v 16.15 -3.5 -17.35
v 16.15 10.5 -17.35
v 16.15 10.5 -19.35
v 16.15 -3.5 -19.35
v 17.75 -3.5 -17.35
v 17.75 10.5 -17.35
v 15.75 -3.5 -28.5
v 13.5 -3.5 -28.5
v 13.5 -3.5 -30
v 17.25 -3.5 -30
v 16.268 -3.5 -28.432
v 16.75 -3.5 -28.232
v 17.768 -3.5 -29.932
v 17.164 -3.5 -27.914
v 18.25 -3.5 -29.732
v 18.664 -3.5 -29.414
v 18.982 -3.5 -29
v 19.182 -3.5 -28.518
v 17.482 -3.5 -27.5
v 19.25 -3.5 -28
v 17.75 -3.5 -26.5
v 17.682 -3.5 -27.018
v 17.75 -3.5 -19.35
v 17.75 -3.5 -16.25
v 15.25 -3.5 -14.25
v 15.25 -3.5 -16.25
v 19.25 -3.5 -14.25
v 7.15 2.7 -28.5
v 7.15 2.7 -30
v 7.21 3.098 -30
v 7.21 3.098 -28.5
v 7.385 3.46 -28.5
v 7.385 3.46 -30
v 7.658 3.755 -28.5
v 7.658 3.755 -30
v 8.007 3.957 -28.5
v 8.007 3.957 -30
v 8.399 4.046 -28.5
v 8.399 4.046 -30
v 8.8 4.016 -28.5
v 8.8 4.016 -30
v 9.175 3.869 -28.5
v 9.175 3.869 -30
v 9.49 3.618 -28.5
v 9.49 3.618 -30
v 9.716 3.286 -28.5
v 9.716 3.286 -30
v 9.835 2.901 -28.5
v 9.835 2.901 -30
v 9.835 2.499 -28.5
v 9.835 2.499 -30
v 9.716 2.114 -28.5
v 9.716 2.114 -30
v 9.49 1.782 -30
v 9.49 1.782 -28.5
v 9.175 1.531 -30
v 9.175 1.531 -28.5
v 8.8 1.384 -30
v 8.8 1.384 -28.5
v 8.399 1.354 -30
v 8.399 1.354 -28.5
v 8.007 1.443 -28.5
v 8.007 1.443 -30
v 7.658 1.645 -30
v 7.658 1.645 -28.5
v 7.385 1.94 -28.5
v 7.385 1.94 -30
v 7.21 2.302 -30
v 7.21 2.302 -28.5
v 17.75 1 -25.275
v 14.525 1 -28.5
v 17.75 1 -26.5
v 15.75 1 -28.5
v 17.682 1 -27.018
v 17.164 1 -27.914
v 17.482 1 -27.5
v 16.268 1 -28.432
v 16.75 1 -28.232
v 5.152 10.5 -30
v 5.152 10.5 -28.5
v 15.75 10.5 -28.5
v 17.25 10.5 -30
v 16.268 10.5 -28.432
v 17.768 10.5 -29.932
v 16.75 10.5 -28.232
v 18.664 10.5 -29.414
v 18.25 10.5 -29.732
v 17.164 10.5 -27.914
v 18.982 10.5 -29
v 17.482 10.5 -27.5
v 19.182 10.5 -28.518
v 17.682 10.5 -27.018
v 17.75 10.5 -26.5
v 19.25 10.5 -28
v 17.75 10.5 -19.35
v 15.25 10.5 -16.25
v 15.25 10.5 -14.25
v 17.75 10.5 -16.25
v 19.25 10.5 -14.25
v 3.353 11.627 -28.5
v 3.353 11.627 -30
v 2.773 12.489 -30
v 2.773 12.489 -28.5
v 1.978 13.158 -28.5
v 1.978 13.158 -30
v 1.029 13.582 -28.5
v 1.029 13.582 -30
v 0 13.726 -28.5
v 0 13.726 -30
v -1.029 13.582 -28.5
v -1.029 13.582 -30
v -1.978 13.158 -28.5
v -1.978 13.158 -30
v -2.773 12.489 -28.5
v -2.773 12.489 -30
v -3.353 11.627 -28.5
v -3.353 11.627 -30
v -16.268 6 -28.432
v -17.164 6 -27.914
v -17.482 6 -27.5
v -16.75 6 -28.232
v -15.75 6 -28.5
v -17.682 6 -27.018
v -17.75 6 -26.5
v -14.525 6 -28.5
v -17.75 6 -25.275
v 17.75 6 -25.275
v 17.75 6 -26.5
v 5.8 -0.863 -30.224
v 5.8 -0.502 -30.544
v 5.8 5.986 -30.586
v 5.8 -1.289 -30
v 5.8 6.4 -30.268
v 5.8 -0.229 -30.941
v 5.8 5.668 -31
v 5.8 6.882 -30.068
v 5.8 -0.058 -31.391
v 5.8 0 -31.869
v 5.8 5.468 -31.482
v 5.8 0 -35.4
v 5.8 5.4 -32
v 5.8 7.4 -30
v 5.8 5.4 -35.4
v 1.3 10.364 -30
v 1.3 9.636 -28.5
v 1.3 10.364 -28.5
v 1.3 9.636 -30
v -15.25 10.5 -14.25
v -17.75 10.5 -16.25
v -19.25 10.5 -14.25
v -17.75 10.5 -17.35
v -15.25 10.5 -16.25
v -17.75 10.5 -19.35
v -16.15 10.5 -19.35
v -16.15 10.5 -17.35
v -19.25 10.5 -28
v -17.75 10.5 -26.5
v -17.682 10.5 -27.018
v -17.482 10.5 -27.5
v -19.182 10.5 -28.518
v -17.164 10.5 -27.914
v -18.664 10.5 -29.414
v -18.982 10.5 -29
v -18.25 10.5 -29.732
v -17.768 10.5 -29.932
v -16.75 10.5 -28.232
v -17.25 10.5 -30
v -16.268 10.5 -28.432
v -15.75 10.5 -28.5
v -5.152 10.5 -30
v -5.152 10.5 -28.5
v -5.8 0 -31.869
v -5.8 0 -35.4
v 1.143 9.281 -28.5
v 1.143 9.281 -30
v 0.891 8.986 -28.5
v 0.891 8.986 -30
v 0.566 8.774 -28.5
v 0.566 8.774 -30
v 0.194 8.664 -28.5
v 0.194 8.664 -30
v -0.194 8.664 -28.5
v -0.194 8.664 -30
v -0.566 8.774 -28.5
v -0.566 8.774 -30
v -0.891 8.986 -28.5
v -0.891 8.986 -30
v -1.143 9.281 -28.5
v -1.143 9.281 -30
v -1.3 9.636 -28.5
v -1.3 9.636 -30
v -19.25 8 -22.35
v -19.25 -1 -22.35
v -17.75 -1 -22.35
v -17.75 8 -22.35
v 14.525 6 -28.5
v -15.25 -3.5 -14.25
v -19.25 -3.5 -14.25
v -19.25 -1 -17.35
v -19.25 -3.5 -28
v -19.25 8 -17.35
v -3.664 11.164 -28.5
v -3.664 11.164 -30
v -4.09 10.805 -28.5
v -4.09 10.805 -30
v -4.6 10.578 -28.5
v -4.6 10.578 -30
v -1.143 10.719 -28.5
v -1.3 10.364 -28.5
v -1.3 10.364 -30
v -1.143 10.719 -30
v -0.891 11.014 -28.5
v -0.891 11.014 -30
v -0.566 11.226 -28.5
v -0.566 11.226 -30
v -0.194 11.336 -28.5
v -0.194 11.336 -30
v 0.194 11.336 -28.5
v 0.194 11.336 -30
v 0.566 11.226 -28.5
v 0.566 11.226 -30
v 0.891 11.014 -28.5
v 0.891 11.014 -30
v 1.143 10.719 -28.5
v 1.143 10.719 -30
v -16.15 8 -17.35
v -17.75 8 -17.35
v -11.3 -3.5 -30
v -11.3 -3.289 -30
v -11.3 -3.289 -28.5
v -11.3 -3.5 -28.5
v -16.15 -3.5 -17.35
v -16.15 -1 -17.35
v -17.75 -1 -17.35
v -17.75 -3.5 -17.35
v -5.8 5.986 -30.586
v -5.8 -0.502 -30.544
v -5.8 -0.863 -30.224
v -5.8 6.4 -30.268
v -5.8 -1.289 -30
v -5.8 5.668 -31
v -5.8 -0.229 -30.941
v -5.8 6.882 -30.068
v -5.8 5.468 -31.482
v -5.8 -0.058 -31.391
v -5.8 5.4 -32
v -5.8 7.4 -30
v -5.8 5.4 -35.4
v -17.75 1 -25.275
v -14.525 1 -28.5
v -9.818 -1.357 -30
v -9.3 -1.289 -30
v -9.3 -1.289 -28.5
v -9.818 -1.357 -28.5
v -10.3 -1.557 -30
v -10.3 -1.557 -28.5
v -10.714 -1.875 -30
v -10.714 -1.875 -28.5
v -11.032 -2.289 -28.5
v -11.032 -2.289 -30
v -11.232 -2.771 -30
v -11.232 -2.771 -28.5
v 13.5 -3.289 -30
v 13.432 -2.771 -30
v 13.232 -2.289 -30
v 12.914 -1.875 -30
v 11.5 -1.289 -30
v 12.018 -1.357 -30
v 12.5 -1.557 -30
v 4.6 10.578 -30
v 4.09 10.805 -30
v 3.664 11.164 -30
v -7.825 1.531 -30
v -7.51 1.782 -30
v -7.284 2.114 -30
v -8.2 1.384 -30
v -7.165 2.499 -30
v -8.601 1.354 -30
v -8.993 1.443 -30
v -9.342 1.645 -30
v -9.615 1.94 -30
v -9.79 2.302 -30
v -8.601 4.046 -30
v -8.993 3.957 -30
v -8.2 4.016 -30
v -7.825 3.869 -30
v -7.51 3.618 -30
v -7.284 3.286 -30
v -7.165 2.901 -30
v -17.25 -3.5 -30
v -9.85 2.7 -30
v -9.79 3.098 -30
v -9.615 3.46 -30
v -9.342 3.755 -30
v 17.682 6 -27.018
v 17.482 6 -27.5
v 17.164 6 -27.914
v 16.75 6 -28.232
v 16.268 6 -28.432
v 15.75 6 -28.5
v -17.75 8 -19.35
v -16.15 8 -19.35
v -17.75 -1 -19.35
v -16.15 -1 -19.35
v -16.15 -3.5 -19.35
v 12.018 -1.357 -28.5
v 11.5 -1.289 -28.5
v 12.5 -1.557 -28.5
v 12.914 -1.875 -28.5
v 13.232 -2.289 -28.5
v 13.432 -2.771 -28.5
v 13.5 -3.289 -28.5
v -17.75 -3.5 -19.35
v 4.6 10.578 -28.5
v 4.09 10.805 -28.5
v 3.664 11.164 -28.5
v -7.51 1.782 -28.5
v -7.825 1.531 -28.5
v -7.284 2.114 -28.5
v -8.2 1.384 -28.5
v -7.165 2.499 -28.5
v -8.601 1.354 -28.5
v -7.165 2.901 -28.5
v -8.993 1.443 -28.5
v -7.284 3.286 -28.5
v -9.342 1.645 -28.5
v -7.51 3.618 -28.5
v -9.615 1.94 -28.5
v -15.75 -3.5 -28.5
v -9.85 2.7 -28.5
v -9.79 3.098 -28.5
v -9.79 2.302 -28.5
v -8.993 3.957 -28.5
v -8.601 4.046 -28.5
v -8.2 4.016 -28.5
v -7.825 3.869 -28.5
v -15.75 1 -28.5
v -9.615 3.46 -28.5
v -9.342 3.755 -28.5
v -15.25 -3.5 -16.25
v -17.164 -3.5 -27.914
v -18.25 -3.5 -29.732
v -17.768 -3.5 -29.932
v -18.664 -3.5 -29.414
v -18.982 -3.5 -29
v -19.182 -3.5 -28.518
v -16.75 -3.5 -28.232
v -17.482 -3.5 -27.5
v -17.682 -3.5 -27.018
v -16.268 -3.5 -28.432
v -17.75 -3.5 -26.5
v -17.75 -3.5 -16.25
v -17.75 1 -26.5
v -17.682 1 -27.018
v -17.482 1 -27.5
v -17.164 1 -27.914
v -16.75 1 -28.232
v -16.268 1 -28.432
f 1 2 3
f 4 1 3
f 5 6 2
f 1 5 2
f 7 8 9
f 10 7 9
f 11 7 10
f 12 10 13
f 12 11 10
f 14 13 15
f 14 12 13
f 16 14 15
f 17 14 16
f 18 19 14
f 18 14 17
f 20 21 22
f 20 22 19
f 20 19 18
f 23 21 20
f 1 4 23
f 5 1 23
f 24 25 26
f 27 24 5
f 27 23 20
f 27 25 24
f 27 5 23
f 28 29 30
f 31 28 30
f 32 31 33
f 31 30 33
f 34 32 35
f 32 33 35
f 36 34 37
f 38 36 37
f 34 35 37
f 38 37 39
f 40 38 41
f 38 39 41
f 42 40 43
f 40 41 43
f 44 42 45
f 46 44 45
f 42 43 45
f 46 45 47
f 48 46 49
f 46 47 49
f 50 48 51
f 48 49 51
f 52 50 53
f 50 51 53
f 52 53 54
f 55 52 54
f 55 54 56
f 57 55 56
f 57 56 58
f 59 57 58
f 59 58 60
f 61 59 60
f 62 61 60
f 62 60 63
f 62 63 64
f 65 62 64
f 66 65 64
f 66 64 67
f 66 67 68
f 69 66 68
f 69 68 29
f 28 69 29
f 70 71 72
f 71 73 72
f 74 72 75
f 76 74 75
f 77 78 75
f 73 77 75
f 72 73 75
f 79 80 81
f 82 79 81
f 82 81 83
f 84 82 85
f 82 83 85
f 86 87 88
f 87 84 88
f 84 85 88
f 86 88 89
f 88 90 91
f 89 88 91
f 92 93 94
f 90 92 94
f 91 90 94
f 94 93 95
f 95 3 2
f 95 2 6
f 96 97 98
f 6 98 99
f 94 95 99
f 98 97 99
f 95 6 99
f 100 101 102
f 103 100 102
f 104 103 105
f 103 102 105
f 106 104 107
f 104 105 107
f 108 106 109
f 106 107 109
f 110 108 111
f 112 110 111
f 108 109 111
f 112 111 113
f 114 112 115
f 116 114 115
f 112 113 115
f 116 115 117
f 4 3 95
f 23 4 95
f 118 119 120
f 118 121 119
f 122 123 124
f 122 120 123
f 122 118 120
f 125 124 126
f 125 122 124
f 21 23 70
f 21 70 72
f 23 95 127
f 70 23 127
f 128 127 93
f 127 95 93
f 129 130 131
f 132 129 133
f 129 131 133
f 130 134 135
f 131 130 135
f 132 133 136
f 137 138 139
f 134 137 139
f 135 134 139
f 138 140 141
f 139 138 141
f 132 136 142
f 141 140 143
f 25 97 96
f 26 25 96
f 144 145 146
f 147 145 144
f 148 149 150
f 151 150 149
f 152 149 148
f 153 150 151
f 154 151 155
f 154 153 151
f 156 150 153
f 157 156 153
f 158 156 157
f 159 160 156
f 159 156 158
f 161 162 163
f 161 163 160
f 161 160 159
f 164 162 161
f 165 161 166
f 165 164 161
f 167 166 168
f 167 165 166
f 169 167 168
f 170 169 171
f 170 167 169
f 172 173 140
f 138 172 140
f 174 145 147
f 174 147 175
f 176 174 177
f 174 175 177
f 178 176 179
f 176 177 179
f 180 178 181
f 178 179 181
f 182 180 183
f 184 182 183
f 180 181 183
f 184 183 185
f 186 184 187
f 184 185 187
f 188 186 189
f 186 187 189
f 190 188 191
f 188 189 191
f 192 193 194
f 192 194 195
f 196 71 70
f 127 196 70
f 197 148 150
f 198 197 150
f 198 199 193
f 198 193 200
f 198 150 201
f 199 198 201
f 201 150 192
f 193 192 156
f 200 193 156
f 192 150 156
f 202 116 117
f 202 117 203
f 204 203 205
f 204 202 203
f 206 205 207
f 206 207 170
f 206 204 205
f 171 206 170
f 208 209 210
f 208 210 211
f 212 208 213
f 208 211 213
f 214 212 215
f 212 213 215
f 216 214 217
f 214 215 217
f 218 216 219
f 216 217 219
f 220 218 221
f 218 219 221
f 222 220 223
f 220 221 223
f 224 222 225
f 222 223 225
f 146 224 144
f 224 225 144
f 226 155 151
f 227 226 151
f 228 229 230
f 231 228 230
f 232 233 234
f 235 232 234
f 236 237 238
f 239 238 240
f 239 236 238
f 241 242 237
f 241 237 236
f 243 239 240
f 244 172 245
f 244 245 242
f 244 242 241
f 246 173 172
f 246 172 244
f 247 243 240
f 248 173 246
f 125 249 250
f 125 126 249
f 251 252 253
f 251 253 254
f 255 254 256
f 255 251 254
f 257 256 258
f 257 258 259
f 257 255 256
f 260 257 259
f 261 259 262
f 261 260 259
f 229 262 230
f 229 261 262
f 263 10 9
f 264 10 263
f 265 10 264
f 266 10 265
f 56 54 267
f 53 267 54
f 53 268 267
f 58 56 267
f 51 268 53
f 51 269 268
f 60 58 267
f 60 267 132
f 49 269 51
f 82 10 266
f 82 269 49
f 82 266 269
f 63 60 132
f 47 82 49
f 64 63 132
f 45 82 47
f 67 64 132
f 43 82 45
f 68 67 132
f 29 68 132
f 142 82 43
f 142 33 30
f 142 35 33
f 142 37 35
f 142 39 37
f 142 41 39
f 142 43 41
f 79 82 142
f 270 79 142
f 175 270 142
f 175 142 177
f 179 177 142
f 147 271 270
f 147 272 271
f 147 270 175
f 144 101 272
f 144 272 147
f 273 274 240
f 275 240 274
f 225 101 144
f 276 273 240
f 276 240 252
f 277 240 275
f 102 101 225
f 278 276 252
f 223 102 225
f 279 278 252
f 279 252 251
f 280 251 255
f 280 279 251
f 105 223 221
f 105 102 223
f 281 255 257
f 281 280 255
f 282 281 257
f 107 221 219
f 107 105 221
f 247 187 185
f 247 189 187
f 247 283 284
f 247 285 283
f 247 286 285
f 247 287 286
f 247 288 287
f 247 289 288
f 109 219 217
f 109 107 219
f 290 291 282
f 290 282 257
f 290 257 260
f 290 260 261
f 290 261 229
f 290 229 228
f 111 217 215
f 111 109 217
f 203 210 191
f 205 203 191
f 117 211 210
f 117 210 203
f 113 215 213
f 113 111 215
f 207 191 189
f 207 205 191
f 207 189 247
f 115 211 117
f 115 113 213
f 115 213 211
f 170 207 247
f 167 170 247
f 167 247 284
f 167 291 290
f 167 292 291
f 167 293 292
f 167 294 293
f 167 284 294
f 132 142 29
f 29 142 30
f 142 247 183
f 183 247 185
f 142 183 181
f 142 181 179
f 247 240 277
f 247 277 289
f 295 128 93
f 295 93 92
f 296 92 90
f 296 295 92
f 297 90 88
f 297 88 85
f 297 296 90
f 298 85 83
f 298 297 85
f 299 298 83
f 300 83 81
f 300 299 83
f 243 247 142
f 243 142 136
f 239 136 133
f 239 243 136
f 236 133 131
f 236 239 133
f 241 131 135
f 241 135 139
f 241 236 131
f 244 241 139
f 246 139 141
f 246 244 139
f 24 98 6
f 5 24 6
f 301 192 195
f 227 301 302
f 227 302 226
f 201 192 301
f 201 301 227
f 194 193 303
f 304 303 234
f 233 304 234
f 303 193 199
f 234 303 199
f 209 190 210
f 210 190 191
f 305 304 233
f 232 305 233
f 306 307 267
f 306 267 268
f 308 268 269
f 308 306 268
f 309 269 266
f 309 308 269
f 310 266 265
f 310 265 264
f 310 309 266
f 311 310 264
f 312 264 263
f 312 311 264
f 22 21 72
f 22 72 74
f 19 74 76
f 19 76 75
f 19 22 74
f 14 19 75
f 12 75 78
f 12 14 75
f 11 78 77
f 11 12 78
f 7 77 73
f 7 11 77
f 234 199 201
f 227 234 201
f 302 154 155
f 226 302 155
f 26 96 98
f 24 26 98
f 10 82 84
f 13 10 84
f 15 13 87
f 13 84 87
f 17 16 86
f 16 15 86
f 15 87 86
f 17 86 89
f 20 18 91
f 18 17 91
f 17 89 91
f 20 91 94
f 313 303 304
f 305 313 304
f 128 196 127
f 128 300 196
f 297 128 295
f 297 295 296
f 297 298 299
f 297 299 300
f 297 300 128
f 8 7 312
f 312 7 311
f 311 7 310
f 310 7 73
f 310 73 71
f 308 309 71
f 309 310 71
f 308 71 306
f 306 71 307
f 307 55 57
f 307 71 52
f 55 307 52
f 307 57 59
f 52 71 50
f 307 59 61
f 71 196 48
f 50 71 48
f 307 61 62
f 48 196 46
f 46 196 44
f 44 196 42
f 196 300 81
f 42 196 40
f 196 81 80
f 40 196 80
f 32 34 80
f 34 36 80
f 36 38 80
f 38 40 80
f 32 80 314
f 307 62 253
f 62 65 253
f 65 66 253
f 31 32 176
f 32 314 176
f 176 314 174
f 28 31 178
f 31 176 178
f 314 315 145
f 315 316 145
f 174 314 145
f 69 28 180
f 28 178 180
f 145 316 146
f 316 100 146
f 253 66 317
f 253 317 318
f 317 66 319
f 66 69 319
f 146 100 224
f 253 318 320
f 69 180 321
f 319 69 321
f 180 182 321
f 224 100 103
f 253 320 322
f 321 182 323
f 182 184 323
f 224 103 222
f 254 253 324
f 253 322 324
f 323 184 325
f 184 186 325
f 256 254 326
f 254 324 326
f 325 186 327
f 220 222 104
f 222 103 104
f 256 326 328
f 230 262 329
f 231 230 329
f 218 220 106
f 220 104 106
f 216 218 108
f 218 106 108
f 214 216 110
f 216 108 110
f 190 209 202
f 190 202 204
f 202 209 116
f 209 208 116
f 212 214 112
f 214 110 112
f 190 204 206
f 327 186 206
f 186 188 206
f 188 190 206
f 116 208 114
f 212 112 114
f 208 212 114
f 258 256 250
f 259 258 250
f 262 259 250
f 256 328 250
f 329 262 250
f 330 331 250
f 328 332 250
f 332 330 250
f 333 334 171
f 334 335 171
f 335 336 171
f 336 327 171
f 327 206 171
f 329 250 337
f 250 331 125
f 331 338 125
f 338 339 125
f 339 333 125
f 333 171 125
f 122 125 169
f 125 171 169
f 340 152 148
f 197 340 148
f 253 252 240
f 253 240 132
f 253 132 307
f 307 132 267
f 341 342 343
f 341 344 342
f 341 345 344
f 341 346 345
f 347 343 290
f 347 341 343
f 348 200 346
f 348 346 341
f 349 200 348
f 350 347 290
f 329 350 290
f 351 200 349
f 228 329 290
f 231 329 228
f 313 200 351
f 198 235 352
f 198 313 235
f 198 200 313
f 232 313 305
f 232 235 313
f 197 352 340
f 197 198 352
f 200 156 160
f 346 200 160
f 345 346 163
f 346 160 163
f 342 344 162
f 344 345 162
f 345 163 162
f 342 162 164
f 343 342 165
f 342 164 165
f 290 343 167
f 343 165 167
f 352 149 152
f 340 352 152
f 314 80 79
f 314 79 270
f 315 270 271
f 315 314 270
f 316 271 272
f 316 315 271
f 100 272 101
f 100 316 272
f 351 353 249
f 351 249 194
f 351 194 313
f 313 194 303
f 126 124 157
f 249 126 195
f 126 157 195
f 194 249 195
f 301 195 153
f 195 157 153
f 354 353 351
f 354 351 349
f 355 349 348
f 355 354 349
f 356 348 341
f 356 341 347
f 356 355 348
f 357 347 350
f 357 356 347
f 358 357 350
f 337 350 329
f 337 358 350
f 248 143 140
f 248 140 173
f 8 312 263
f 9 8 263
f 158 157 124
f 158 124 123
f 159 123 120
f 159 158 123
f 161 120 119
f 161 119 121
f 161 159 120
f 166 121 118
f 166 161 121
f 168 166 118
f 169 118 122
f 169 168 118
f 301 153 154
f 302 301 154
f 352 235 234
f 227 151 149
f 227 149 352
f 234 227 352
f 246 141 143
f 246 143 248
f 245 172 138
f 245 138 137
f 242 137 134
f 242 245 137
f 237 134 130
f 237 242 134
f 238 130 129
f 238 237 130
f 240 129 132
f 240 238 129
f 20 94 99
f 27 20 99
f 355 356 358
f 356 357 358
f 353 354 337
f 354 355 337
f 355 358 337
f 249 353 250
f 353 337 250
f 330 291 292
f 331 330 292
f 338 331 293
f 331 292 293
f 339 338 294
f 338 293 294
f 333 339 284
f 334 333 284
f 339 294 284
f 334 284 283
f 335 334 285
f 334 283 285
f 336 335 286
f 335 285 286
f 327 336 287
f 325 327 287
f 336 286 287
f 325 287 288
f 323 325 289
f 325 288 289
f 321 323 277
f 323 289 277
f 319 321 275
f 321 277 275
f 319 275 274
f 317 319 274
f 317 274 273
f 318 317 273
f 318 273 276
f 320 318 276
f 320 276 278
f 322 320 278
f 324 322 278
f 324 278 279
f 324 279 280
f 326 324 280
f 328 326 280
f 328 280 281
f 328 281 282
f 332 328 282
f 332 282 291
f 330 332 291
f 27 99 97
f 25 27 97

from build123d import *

# Parameters (mm, degrees)
SKETCH_1_W               = 27
SKETCH_1_H               = 17
EXTRUDE_1_DEPTH          = 1
SKETCH_2_R               = 2.55
CUT_EXTRUDE_1_DEPTH      = 16.984367363
EXTRUDE_2_DEPTH          = 17
SKETCH_6_W               = 1.5
SKETCH_6_H               = 2
EXTRUDE_3_DEPTH          = 2
CHAMFER_1_SIZE           = 1
CUT_EXTRUDE_4_REACH      = 39.316
SKETCH_8_R               = 2
FILLET_1_R               = 3
SKETCH_9_W               = 7
SKETCH_9_H               = 13
EXTRUDE_4_DEPTH          = 1.5
SKETCH_7_R               = 1.35
CUT_EXTRUDE_5_DEPTH      = 10
CUT_EXTRUDE_6_REACH      = 41.373
FILLET_2_R               = 2.2
SKETCH_13_W              = 11.6
SKETCH_13_H              = 5.4
EXTRUDE_6_DEPTH          = 5.4
CUT_EXTRUDE_7_DEPTH      = 45.299097095
CUT_EXTRUDE_7_DEPTH_BACK = 45.299097095
SKETCH_14_OUTSIDE_W      = 46.85
SKETCH_14_OUTSIDE_H      = 49.25
SKETCH_14_OUTSIDE_W_2    = 27
SKETCH_14_OUTSIDE_H_2    = 6.9
EXTRUDE_7_DEPTH          = 3.5
EXTRUDE_7_DEPTH_BACK     = 10.5
SKETCH_16_W              = 5.6
SKETCH_16_H              = 1.5
SKETCH_16_W_2            = 4.4
SKETCH_16_W_3            = 12.2
EXTRUDE_8_DEPTH          = 2
EXTRUDE_9_DEPTH          = 2.5
CUT_EXTRUDE_8_REACH      = 55.893
SKETCH_18_W              = 5
SKETCH_18_H              = 9
EXTRUDE_START            = -1.5
SKETCH_19_R              = 3.726433752
SKETCH_19_R_2            = 1.35
SKETCH_19_W              = 24.8
SKETCH_19_H              = 1.288897449
EXTRUDE_10_DEPTH         = 1.5
FILLET_4_R               = 2


# Some blends are built 0.0001 mm under size
with BuildPart() as part:
    # 草图1 → 凸台-拉伸1 (new body)
    with BuildSketch(Plane.XY):
        Rectangle(SKETCH_1_W, SKETCH_1_H)
    extrude(amount=EXTRUDE_1_DEPTH)

    # 草图2 → 切除-拉伸1 (cut, through all)
    with BuildSketch(Plane.XY.offset(1)):
        with Locations((0, 4.125)):
            Circle(SKETCH_2_R)
        with Locations((0, -4.125)):
            Circle(SKETCH_2_R)
        with Locations((8.27, 4.125)):
            Circle(SKETCH_2_R)
        with Locations((8.27, -4.125)):
            Circle(SKETCH_2_R)
        with Locations((-8.27, 4.125)):
            Circle(SKETCH_2_R)
        with Locations((-8.27, -4.125)):
            Circle(SKETCH_2_R)
    extrude(amount=-CUT_EXTRUDE_1_DEPTH, mode=Mode.SUBTRACT)

    # 草图3 → 凸台-拉伸2 (add)
    with BuildSketch(Plane.XZ.offset(8.5)):
        Polygon((13.5, 0), (19, 0), (19, -28.5), (-13.5, -28.5), (-13.5, -30), (20.5, -30), (20.5, 1), (13.5, 1), align=None)
    extrude(amount=-EXTRUDE_2_DEPTH)

    # 草图6 → 凸台-拉伸3 (add, symmetric)
    with BuildSketch(Plane(origin=(0, 0, 0), x_dir=(1, 0, 0), z_dir=(0, 1, 0))):
        Polygon((19, 0), (19, 5), (14, 0), align=None)
        Polygon((19, 28.5), (14, 28.5), (19, 23.5), align=None)
        with Locations((18.25, 20)):
            Rectangle(SKETCH_6_W, SKETCH_6_H)
    extrude(amount=EXTRUDE_3_DEPTH, both=True)

    # 倒角1
    chamfer_1_edges = [part.edges().sort_by_distance(p)[0] for p in [
        (-13.5, 0, 0),
    ]]
    chamfer(chamfer_1_edges, length=CHAMFER_1_SIZE - 0.0001)  # a hair under: the kernel refuses the full size

    # 草图8 → 切除-拉伸4 (cut, up to next)
    with BuildSketch(Plane(origin=(0, 0, 0), x_dir=(-1, 0, 0), z_dir=(0, 0, -1)), mode=Mode.PRIVATE) as cut_extrude_4_sk1:
        Circle(SKETCH_8_R)
    cut_extrude_4_tool1 = extrude(cut_extrude_4_sk1.sketch, amount=-CUT_EXTRUDE_4_REACH, mode=Mode.PRIVATE) & part.part
    add(cut_extrude_4_tool1.solids().sort_by_distance((0, 0, 0))[0], mode=Mode.SUBTRACT)

    # 圆角1
    fillet_1_edges = [part.edges().sort_by_distance(p)[0] for p in [
        (20.5, 0, 1),
        (20.5, 0, -30),
        (19, 5.25, -28.5),
        (19, 5.25, 0),
        (19, -5.25, 0),
        (19, -5.25, -28.5),
    ]]
    fillet(fillet_1_edges, radius=FILLET_1_R)

    # 草图9 → 凸台-拉伸4 (add)
    with BuildSketch(Plane(origin=(0, 0, -30), x_dir=(-1, 0, 0), z_dir=(0, 0, -1))):
        with Locations((0, 6.5)):
            Rectangle(SKETCH_9_W, SKETCH_9_H)
    extrude(amount=-EXTRUDE_4_DEPTH)

    # 草图7 → 切除-拉伸5 (cut)
    with BuildSketch(Plane(origin=(0, 0, -30), x_dir=(-1, 0, 0), z_dir=(0, 0, -1))):
        with Locations((0, 10)):
            Circle(SKETCH_7_R)
        with Locations((-8.5, 2.7)):
            Circle(SKETCH_7_R)
        with Locations((8.5, 2.7)):
            Circle(SKETCH_7_R)
    extrude(amount=-CUT_EXTRUDE_5_DEPTH, mode=Mode.SUBTRACT)

    # 草图11 → 切除-拉伸6 (cut, up to next)
    with BuildSketch(Plane(origin=(0, 0, -30), x_dir=(-1, 0, 0), z_dir=(0, 0, -1)), mode=Mode.PRIVATE) as cut_extrude_6_sk1:
        with BuildLine():
            Line((13.5, -8.5), (13.5, 0))
            Line((13.5, 0), (-9, 0))
            ThreePointArc((-9, 0), (-15.01040764, -2.48959236), (-17.5, -8.5))
            Line((-17.5, -8.5), (13.5, -8.5))
        make_face()
    cut_extrude_6_tool1 = extrude(cut_extrude_6_sk1.sketch, amount=-CUT_EXTRUDE_6_REACH, mode=Mode.PRIVATE) & part.part
    add(cut_extrude_6_tool1.solids().sort_by_distance((1.149624, -4.397011, -30))[0], mode=Mode.SUBTRACT)

    # 圆角2
    fillet_2_edges = [part.edges().sort_by_distance(p)[0] for p in [
        (-3.5, 13, -29.25),
        (-3.5, 8.5, -29.25),
        (3.5, 13, -29.25),
        (3.5, 8.5, -29.25),
        (-13.5, 0, -29.25),
        (-13.5, 8.5, -29.25),
    ]]
    fillet(fillet_2_edges, radius=FILLET_2_R)

    # 草图13 → 凸台-拉伸6 (add)
    with BuildSketch(Plane(origin=(0, 0, -30), x_dir=(-1, 0, 0), z_dir=(0, 0, -1))):
        with Locations((0, 2.7)):
            Rectangle(SKETCH_13_W, SKETCH_13_H)
    extrude(amount=EXTRUDE_6_DEPTH)

    # 草图14 outside → 切除-拉伸7 (cut, two sides: drawn at the far end of the back side and taken through both)
    with BuildSketch(Plane(origin=(0, 8.5, 0), x_dir=(1, 0, 0), z_dir=(0, 1, 0)).offset(-CUT_EXTRUDE_7_DEPTH_BACK)):
        with Locations((3.5, 17.2)):
            Rectangle(SKETCH_14_OUTSIDE_W, SKETCH_14_OUTSIDE_H)
        with Locations((0, 31.95)):
            Rectangle(SKETCH_14_OUTSIDE_W_2, SKETCH_14_OUTSIDE_H_2, mode=Mode.SUBTRACT)
    extrude(amount=CUT_EXTRUDE_7_DEPTH + CUT_EXTRUDE_7_DEPTH_BACK, mode=Mode.SUBTRACT)

    # 草图15 → 凸台-拉伸7 (add, two sides: drawn at the far end of the back side and taken through both)
    with BuildSketch(Plane.XZ.offset(-EXTRUDE_7_DEPTH_BACK)):
        Polygon((-19.25, -14.25), (-19.25, -30), (-11.3, -30), (-11.3, -28.5), (-17.75, -28.5), (-17.75, -19.35), (-16.15, -19.35), (-16.15, -17.35), (-17.75, -17.35), (-17.75, -16.25), (-15.25, -16.25), (-15.25, -14.25), align=None)
        Polygon((17.75, -28.5), (13.5, -28.5), (13.5, -30), (19.25, -30), (19.25, -14.25), (15.25, -14.25), (15.25, -16.25), (17.75, -16.25), (17.75, -17.35), (16.15, -17.35), (16.15, -19.35), (17.75, -19.35), align=None)
    extrude(amount=EXTRUDE_7_DEPTH + EXTRUDE_7_DEPTH_BACK)

    # 草图16 → 凸台-拉伸8 (add)
    with BuildSketch(Plane(origin=(0, 8.5, 0), x_dir=(1, 0, 0), z_dir=(0, 1, 0))):
        with Locations((-8.5, 29.25)):
            Rectangle(SKETCH_16_W, SKETCH_16_H)
        with Locations((-3.5, 29.25)):
            Rectangle(SKETCH_16_W_2, SKETCH_16_H)
        with Locations((7.4, 29.25)):
            Rectangle(SKETCH_16_W_3, SKETCH_16_H)
    extrude(amount=EXTRUDE_8_DEPTH)

    # 草图17 → 凸台-拉伸9 (add, symmetric)
    with BuildSketch(Plane(origin=(0, 3.5, 0), x_dir=(-1, 0, 0), z_dir=(0, -1, 0))):
        Polygon((17.75, 25.275), (14.525, 28.5), (17.75, 28.5), align=None)
        Polygon((-17.75, 25.275), (-17.75, 28.5), (-14.525, 28.5), align=None)
    extrude(amount=EXTRUDE_9_DEPTH, both=True)

    # 草图18 → 切除-拉伸8 (cut, up to next)
    with BuildSketch(Plane.ZY.offset(19.25), mode=Mode.PRIVATE) as cut_extrude_8_sk1:
        with Locations((-19.85, 3.5)):
            Rectangle(SKETCH_18_W, SKETCH_18_H)
    cut_extrude_8_tool1 = extrude(cut_extrude_8_sk1.sketch, amount=-CUT_EXTRUDE_8_REACH, mode=Mode.PRIVATE) & part.part
    add(cut_extrude_8_tool1.solids().sort_by_distance((-19.25, 3.5, -19.85))[0], mode=Mode.SUBTRACT)

    # 草图19 → 凸台-拉伸10 (add)
    # profile 1 of 2: a face of its own
    with BuildSketch(Plane.XY.offset(-28.5).offset(EXTRUDE_START)):
        with Locations((0, 10)):
            Circle(SKETCH_19_R)
        with Locations((0, 10)):
            Circle(SKETCH_19_R_2, mode=Mode.SUBTRACT)
    # profile 2 of 2: a face of its own
    with BuildSketch(Plane.XY.offset(-28.5).offset(EXTRUDE_START)):
        with Locations((1.1, -0.644448725)):
            Rectangle(SKETCH_19_W, SKETCH_19_H)
    extrude(amount=EXTRUDE_10_DEPTH)

    # 圆角4
    # the kernel refuses this fillet: 2 mm, written as the material it adds along each edge
    with BuildSketch(Plane(origin=(-5.8, 5.4, -30), x_dir=(0, 1, 0), z_dir=(1, 0, 0))) as fillet_4_piece_1:
        with BuildLine():
            CenterArc((FILLET_4_R, -FILLET_4_R), FILLET_4_R, 90, 90)
            Line((0, -FILLET_4_R), (0, 0))
            Line((0, 0), (FILLET_4_R, 0))
        make_face()
    extrude(amount=11.6)
    with BuildSketch(Plane(origin=(13.5, -1.288897449, -28.5), x_dir=(0, -1, 0), z_dir=(0, 0, -1))) as fillet_4_piece_2:
        with BuildLine():
            CenterArc((FILLET_4_R, FILLET_4_R), FILLET_4_R, 180, 90)
            Line((0, FILLET_4_R), (0, 0))
            Line((0, 0), (FILLET_4_R, 0))
        make_face()
    extrude(amount=1.5)
    with BuildSketch(Plane(origin=(17.75, 1, -28.5), x_dir=(-1, 0, 0), z_dir=(0, 1, 0)), Plane(origin=(-17.75, 6, -28.5), x_dir=(1, 0, 0), z_dir=(0, -1, 0)), Plane(origin=(-17.75, 10.5, -28.5), x_dir=(1, 0, 0), z_dir=(0, -1, 0)), Plane(origin=(17.75, -3.5, -28.5), x_dir=(-1, 0, 0), z_dir=(0, 1, 0))) as fillet_4_piece_3:
        with BuildLine():
            CenterArc((FILLET_4_R, FILLET_4_R), FILLET_4_R, 180, 90)
            Line((0, FILLET_4_R), (0, 0))
            Line((0, 0), (FILLET_4_R, 0))
        make_face()
    extrude(amount=9.5)
    with BuildSketch(Plane(origin=(-3.692737265, 10.5, -28.5), x_dir=(-1, 0, 0), z_dir=(0, 0, -1))) as fillet_4_piece_4:
        with BuildLine():
            CenterArc((1.459159814, 2), FILLET_4_R, 205.88535786, 64.11464214)
            ThreePointArc((-0.340178937, 1.126856222), (-0.125315404, 0.576944648), (0, 0))
            Line((0, 0), (1.459159814, 0))
        make_face()
    extrude(amount=1.5)
    with BuildSketch(Plane(origin=(3.692737265, 10.5, -28.5), x_dir=(-0.28900142054358374, 0.9573286681823493, 0), z_dir=(0, 0, -1))) as fillet_4_piece_5:
        with BuildLine():
            CenterArc((1.492958077, 1.974898363), FILLET_4_R, 196.798181975, 64.11464214)
            Line((-0.421699259, 1.396895522), (0, 0))
            ThreePointArc((0, 0), (0.588541981, 0.046769794), (1.177083962, 0))
        make_face()
    extrude(amount=1.5)
    with BuildSketch(Plane(origin=(-5.8, 0, -30), x_dir=(0, -1, 0), z_dir=(1, 0, 0))) as fillet_4_piece_6:
        with BuildLine():
            CenterArc((2, 1.869313554), FILLET_4_R, 180, 69.172765444)
            Line((0, 1.869313554), (0, 0))
            Line((0, 0), (1.288897449, 0))
        make_face()
    extrude(amount=11.6)
    with BuildSketch(Plane(origin=(-11.3, -1.288897449, -30), x_dir=(1, 0, 0), z_dir=(0, 0, 1))) as fillet_4_piece_7:
        with BuildLine():
            CenterArc((FILLET_4_R, -FILLET_4_R), FILLET_4_R, 90, 90)
            Line((0, -FILLET_4_R), (0, 0))
            Line((0, 0), (FILLET_4_R, 0))
        make_face()
    extrude(amount=1.5)
    # the kernel refuses this fillet: 2 mm, written as the material it takes off along each edge
    with BuildSketch(Plane(origin=(19.25, 15.5, -30), x_dir=(-1, 0, 0), z_dir=(0, -1, 0))) as fillet_4_2_piece_1:
        with BuildLine():
            CenterArc((FILLET_4_R, -FILLET_4_R), FILLET_4_R, 90, 90)
            Line((0, -FILLET_4_R), (0, 0))
            Line((0, 0), (FILLET_4_R, 0))
        make_face()
    extrude(amount=24, mode=Mode.SUBTRACT)
    with BuildSketch(Plane(origin=(-19.25, 15.5, -30), x_dir=(1, 0, 0), z_dir=(0, -1, 0))) as fillet_4_2_piece_2:
        with BuildLine():
            CenterArc((FILLET_4_R, FILLET_4_R), FILLET_4_R, 180, 90)
            Line((0, FILLET_4_R), (0, 0))
            Line((0, 0), (FILLET_4_R, 0))
        make_face()
    extrude(amount=24, mode=Mode.SUBTRACT)


solid = part.part
